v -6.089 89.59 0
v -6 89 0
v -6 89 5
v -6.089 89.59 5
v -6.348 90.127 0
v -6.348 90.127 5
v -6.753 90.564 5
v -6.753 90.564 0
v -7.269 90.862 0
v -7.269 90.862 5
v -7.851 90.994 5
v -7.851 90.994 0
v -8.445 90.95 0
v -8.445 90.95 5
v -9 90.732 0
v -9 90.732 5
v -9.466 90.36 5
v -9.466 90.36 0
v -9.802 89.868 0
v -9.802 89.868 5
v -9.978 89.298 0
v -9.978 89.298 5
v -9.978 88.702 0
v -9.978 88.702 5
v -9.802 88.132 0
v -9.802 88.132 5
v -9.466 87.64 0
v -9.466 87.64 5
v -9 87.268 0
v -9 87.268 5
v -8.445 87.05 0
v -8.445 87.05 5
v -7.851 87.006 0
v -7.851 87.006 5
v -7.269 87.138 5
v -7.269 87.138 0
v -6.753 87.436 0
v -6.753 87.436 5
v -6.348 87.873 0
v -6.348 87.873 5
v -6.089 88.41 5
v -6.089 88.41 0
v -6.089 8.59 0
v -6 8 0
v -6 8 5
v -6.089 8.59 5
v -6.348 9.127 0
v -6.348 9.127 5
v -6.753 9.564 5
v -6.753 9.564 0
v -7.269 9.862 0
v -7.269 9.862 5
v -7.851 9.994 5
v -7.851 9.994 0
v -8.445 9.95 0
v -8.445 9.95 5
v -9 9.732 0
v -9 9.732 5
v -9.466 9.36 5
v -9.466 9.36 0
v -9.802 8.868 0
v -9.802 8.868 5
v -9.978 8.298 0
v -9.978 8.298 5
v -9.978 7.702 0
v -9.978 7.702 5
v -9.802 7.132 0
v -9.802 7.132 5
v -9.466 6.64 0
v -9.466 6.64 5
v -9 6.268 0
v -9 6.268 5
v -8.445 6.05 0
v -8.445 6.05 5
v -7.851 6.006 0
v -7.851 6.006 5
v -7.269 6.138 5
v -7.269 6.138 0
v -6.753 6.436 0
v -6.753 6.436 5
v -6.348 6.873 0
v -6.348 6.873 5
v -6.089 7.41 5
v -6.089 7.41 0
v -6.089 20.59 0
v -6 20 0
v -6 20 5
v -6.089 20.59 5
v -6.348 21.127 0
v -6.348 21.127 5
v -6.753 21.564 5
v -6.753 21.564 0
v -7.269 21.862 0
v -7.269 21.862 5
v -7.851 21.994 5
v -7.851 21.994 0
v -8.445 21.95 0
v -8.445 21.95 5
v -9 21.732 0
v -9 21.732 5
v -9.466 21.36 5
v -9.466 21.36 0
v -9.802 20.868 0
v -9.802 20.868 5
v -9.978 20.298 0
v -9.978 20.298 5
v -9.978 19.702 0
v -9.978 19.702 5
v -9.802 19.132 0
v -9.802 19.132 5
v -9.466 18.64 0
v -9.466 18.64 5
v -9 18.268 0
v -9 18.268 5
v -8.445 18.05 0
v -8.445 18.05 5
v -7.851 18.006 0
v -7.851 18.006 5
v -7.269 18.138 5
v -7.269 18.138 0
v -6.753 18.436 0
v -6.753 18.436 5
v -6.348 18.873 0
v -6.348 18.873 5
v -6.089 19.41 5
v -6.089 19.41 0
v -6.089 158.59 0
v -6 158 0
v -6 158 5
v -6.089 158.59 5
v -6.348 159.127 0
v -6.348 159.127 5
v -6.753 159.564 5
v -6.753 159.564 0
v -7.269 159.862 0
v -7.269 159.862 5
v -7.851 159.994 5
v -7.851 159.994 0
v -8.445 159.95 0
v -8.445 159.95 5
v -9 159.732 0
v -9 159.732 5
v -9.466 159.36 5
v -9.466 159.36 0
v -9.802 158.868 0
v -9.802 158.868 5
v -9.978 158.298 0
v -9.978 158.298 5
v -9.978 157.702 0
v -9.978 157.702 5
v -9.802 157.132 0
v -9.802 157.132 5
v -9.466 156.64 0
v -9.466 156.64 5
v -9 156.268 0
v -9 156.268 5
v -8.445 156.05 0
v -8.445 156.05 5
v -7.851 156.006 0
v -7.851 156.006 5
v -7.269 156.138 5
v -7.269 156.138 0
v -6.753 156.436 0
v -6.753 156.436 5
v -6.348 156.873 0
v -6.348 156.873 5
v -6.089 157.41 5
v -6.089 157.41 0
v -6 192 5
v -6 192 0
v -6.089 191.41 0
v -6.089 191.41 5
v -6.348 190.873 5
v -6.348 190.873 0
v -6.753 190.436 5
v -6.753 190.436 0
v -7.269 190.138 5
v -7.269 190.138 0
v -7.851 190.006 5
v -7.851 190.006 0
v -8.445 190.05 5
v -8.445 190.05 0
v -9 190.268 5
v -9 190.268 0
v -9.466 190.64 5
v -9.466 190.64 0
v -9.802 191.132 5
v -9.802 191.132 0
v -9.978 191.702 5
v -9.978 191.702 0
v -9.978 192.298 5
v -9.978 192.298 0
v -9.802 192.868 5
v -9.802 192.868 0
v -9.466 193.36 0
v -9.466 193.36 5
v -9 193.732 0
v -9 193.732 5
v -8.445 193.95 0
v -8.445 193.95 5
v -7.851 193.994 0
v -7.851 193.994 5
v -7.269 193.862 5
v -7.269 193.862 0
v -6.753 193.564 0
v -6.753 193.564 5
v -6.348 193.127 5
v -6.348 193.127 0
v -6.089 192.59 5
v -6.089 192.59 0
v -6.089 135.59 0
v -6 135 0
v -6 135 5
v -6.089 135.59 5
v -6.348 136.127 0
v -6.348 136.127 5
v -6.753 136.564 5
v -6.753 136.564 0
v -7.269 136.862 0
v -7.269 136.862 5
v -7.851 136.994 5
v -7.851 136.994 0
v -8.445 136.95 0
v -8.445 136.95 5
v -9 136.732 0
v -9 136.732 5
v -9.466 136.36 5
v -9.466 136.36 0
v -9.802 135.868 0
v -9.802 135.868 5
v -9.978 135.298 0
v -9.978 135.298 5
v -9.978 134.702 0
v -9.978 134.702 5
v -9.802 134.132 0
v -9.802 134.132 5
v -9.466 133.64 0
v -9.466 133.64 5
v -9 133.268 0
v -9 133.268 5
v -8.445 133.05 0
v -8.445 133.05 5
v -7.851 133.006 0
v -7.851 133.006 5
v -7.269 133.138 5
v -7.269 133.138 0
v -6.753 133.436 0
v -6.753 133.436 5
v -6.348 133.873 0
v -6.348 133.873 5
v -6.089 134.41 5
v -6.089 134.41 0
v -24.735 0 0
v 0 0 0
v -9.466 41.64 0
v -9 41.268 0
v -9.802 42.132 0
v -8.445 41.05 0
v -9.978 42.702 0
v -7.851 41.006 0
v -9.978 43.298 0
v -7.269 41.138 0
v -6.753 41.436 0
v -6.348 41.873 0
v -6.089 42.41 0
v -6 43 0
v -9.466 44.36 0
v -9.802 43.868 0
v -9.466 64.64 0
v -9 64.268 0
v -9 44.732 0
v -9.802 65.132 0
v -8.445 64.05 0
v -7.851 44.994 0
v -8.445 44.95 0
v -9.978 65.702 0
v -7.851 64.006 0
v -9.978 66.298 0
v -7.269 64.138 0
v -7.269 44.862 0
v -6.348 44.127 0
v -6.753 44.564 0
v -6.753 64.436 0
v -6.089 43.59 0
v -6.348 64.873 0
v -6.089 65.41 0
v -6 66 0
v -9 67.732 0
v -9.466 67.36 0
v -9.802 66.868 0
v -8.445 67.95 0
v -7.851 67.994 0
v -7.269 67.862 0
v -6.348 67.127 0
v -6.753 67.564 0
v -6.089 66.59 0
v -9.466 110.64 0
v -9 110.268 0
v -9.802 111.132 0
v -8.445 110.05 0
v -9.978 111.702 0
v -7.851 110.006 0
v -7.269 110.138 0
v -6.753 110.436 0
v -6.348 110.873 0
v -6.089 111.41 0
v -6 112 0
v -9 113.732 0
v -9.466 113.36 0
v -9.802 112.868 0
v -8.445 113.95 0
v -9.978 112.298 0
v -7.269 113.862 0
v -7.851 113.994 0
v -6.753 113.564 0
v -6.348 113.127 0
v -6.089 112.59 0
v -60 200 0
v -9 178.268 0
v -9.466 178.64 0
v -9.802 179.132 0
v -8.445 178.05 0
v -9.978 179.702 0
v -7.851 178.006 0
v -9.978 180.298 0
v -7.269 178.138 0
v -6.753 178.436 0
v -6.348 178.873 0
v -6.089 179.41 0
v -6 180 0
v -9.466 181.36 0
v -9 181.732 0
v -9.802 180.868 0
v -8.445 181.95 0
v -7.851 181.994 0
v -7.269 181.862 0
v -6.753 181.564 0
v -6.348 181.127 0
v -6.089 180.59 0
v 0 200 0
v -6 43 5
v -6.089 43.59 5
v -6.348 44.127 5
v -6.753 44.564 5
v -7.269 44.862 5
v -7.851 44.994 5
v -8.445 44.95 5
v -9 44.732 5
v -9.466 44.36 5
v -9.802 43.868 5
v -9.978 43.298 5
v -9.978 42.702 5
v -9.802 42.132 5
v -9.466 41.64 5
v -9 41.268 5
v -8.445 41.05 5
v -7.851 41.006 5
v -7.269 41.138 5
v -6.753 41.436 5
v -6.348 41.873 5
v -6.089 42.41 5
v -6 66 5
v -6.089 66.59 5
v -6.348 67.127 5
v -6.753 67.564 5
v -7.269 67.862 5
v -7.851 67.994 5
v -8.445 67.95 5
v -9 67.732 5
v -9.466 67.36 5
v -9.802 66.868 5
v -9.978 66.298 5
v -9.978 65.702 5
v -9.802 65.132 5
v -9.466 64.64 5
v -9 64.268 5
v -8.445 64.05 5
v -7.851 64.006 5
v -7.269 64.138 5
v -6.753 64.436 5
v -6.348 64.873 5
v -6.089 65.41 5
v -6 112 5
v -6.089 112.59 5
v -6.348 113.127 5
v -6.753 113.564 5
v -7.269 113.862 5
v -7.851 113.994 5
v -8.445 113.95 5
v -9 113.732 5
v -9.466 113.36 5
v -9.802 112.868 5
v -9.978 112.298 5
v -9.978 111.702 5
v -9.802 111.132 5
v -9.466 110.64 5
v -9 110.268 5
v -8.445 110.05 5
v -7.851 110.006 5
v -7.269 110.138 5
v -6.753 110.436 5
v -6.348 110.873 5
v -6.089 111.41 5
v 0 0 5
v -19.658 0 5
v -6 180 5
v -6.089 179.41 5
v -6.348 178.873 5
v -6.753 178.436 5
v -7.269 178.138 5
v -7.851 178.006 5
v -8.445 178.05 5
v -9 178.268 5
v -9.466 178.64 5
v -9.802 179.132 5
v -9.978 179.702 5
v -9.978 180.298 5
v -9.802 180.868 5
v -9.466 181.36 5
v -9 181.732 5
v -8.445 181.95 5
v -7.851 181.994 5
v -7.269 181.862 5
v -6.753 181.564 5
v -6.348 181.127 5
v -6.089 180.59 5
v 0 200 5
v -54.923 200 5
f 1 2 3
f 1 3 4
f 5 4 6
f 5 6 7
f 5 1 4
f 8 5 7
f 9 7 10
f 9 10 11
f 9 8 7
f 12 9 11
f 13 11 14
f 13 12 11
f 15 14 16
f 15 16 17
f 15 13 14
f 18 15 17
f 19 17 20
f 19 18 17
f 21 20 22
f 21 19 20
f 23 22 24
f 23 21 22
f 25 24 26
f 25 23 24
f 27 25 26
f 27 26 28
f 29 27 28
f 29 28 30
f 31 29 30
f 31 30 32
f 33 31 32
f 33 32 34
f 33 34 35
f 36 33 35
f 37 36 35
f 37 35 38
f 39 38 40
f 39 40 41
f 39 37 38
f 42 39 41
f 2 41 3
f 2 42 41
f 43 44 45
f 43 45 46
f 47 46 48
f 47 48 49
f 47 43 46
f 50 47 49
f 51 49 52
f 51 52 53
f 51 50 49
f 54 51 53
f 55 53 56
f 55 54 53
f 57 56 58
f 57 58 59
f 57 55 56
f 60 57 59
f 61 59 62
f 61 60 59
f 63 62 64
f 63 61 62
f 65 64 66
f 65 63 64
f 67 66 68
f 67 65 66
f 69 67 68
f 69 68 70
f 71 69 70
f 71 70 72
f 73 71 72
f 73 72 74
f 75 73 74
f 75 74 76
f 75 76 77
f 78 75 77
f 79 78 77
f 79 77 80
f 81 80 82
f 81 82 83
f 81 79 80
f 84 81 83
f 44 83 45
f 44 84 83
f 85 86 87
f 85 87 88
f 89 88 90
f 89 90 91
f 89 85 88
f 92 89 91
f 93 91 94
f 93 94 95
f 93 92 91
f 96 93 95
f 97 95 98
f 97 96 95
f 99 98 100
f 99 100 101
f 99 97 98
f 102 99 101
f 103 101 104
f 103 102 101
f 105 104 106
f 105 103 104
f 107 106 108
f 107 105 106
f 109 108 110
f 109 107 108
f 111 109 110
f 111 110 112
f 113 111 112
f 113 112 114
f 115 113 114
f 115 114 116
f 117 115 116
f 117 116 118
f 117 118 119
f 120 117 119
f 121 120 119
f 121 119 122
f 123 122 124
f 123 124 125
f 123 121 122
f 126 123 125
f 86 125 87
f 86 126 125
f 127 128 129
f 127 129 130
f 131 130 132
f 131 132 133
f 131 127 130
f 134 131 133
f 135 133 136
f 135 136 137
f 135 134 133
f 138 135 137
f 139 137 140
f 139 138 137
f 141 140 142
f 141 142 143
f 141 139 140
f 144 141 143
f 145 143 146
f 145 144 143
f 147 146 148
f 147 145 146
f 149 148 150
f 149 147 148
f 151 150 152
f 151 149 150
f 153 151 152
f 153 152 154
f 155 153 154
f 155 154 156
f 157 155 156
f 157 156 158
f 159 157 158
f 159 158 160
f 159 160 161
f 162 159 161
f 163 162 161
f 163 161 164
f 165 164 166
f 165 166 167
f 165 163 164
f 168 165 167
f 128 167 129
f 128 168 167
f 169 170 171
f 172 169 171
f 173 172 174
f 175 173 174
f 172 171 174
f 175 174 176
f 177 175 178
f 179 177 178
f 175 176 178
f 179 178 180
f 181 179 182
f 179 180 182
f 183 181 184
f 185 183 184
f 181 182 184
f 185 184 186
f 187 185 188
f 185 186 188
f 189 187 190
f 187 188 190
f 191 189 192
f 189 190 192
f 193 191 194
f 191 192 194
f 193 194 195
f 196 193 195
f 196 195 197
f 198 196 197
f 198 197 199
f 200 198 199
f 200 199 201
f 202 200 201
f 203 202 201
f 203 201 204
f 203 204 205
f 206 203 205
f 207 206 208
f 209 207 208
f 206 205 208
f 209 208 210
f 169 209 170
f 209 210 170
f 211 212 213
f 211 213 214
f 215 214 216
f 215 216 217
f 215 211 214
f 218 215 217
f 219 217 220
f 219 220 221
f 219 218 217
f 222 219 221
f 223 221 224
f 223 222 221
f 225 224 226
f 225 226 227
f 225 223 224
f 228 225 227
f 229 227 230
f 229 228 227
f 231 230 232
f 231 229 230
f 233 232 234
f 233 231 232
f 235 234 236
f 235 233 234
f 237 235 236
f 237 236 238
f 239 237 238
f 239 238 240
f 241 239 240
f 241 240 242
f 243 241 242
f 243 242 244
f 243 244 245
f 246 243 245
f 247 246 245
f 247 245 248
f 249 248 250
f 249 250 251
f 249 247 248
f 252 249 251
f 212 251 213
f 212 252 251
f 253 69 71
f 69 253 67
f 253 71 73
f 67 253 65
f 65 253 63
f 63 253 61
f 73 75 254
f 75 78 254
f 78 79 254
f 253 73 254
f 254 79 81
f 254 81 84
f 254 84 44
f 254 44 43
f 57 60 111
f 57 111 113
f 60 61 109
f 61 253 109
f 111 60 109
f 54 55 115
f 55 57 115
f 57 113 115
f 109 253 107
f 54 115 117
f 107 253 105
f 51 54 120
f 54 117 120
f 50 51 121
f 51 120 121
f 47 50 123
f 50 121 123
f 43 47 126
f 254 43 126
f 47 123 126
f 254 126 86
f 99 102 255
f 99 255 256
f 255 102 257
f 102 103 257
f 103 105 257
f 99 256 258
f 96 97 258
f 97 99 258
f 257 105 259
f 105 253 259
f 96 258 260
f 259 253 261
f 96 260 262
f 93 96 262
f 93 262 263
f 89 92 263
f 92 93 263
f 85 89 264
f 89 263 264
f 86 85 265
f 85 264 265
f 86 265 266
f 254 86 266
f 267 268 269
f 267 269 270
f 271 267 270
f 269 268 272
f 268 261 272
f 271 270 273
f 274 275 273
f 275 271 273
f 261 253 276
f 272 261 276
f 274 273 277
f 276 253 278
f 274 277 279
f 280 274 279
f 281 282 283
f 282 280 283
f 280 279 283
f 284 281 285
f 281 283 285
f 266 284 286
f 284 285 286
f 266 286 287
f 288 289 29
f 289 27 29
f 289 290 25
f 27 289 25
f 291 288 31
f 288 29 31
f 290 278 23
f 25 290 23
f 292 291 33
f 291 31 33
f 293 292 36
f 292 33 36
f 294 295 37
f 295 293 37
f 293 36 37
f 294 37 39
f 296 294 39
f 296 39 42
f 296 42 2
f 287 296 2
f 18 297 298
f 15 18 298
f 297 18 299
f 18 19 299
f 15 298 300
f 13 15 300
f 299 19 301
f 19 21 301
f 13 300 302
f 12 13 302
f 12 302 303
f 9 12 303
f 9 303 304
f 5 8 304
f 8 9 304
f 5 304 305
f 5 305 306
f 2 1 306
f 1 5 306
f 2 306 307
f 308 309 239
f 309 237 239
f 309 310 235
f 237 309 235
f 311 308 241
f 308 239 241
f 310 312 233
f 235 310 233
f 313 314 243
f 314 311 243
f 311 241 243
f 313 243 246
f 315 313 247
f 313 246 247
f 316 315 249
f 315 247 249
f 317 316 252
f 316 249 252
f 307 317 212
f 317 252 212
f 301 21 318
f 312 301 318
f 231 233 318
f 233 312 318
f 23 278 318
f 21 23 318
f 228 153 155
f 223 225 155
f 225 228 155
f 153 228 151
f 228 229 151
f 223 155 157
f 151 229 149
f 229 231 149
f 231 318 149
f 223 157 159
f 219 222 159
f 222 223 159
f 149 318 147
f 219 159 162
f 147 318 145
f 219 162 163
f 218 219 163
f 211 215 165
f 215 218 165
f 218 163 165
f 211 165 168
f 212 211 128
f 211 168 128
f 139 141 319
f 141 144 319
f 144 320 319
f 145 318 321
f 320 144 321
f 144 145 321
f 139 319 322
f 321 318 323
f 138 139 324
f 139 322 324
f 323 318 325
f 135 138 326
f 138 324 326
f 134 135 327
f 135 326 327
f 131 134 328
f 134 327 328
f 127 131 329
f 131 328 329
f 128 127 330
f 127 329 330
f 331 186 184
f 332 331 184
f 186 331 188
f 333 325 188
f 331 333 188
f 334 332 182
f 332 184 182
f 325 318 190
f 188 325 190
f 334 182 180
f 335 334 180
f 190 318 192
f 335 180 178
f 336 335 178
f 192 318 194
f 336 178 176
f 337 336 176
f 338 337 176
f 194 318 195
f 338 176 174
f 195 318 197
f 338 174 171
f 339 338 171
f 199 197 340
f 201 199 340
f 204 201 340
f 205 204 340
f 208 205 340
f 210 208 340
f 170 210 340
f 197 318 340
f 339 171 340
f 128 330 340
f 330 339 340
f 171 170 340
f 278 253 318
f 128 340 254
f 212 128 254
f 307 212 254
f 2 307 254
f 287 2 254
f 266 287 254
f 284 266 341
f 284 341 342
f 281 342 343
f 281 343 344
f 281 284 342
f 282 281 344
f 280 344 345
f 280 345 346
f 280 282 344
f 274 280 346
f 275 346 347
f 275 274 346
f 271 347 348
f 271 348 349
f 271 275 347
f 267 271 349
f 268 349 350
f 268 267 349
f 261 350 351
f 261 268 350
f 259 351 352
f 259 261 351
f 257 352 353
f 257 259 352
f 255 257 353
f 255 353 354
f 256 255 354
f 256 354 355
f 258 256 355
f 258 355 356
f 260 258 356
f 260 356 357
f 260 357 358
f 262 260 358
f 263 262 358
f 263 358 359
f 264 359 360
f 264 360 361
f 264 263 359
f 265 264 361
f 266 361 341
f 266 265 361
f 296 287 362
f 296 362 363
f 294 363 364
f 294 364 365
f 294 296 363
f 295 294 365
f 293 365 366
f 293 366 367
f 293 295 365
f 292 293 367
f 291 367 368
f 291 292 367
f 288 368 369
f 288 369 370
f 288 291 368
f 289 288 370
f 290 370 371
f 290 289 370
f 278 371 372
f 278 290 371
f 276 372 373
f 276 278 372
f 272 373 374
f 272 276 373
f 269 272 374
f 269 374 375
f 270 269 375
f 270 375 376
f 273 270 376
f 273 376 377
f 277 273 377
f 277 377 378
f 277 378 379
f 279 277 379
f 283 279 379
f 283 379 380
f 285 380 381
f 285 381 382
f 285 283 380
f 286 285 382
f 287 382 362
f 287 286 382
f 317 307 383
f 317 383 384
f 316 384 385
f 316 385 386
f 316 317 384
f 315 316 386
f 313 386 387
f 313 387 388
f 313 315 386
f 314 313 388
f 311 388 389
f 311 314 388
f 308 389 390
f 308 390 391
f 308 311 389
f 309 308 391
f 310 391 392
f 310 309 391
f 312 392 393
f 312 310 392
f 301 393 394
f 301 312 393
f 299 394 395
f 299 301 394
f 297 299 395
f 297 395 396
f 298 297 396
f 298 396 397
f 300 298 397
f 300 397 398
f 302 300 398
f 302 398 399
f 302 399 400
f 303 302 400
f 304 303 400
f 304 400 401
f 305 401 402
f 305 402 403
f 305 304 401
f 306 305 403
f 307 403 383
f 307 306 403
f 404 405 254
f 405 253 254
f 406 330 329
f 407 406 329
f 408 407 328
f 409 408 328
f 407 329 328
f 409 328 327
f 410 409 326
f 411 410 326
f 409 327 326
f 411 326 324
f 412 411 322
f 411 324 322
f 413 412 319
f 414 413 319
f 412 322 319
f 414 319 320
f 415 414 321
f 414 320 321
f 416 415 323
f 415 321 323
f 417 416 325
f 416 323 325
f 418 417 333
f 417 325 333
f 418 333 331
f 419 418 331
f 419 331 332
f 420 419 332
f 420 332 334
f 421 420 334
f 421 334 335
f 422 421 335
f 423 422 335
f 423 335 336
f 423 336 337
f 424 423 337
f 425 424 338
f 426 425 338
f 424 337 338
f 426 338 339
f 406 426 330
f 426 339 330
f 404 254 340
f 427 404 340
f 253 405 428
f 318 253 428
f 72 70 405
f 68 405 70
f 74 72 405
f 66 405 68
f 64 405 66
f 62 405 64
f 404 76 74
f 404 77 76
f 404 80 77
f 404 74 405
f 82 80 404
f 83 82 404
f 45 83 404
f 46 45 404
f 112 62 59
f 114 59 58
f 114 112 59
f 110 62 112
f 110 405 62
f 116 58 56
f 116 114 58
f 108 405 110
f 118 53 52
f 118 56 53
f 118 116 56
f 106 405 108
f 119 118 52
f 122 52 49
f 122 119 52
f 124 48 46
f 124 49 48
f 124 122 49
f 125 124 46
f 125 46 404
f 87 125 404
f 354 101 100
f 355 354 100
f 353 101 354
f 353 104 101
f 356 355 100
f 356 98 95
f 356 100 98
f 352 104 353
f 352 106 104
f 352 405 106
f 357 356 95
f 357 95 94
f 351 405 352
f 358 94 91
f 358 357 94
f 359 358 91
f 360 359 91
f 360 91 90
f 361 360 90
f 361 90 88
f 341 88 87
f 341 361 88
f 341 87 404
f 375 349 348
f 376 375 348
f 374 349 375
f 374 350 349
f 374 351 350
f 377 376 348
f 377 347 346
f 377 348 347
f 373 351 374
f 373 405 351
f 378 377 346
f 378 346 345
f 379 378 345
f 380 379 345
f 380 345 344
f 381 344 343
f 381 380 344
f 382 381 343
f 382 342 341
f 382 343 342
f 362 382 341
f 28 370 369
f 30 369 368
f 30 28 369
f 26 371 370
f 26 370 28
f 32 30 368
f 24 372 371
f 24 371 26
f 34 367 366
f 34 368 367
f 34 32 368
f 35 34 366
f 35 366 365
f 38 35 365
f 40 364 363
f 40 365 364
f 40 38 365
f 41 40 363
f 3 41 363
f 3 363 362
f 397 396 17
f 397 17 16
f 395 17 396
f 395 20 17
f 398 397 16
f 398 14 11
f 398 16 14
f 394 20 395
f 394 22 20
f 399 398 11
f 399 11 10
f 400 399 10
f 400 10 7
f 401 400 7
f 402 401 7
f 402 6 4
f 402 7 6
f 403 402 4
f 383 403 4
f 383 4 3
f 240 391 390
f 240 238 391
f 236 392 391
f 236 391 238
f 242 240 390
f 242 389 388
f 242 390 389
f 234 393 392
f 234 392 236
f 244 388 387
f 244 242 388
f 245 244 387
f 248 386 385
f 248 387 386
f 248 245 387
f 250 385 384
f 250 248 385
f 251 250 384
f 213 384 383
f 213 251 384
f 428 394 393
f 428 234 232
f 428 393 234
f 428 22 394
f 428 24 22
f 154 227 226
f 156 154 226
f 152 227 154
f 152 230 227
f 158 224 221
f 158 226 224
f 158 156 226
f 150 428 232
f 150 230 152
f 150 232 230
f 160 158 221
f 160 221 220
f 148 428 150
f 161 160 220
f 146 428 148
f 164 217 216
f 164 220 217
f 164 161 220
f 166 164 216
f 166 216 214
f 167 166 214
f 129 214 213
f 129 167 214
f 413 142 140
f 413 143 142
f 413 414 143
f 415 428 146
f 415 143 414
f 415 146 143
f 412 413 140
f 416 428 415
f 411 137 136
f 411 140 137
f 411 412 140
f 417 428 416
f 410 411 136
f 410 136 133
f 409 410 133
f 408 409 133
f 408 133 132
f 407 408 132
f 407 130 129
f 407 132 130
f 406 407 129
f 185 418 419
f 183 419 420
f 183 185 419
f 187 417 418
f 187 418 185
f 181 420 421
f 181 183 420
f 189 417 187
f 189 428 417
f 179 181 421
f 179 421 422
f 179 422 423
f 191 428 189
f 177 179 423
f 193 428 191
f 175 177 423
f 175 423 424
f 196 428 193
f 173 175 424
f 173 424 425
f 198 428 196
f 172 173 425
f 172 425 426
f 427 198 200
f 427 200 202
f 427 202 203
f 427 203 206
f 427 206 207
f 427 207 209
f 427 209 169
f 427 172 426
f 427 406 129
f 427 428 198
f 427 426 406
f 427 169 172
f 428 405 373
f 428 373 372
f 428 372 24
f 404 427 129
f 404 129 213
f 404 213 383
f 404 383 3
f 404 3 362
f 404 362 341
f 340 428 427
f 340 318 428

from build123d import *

# Parameters (mm, degrees)
SKETCH1_W              = 60
SKETCH1_H              = 200
BOSS_EXTRUDE1_DEPTH    = 5
SKETCH6_R              = 2
CUT_EXTRUDE3_DEPTH     = 5
SKETCH7_R              = 2
CUT_EXTRUDE4_DEPTH     = 5
LPATTERN1_COUNT        = 6
LPATTERN1_PITCH        = 23
CUT_EXTRUDE_1312_DEPTH = 5
CHAMFER_1373_SIZE      = 5


with BuildPart() as part:
    # Sketch1 → Boss-Extrude1 (new body)
    with BuildSketch(Plane.XY):
        with Locations((-30, 100)):
            Rectangle(SKETCH1_W, SKETCH1_H)
    extrude(amount=BOSS_EXTRUDE1_DEPTH)

    # Sketch6 → Cut-Extrude3 (cut)
    with BuildSketch(Plane.XY):
        with Locations((-8, 8)):
            Circle(SKETCH6_R)
        with Locations((-8, 20)):
            Circle(SKETCH6_R)
    cut_extrude3 = extrude(amount=CUT_EXTRUDE3_DEPTH, mode=Mode.SUBTRACT)

    # Mirror1: Cut-Extrude3 across plane
    add(cut_extrude3.mirror(Plane.ZX.offset(100)), mode=Mode.SUBTRACT)

    # Sketch7 → Cut-Extrude4 (cut)
    with BuildSketch(Plane.XY):
        with Locations((-8, 43)):
            Circle(SKETCH7_R)
    cut_extrude4 = extrude(amount=CUT_EXTRUDE4_DEPTH, mode=Mode.SUBTRACT)

    # LPattern1: Cut-Extrude4 ×6
    with Locations(*[(0, i * LPATTERN1_PITCH, 0) for i in range(1, LPATTERN1_COUNT)]):
        add(cut_extrude4, mode=Mode.SUBTRACT)

    # Sketch3 → Cut-Extrude 1312 (cut)
    with BuildSketch(Plane(origin=(-200, 0, 0), x_dir=(-1, 0, 0), z_dir=(0, 0, -1))):
        Polygon((-140, 0), (-175.265396142, 0), (-140, 200), align=None)
    extrude(amount=-CUT_EXTRUDE_1312_DEPTH, mode=Mode.SUBTRACT)

    # Chamfer 1373
    chamfer_1373_edges = [part.edges().sort_by_distance(p)[0] for p in [
        (-42.367301929, 100, 5),
    ]]
    chamfer(chamfer_1373_edges, length=CHAMFER_1373_SIZE - 0.0001)  # a hair under: the kernel refuses the full size


solid = part.part
